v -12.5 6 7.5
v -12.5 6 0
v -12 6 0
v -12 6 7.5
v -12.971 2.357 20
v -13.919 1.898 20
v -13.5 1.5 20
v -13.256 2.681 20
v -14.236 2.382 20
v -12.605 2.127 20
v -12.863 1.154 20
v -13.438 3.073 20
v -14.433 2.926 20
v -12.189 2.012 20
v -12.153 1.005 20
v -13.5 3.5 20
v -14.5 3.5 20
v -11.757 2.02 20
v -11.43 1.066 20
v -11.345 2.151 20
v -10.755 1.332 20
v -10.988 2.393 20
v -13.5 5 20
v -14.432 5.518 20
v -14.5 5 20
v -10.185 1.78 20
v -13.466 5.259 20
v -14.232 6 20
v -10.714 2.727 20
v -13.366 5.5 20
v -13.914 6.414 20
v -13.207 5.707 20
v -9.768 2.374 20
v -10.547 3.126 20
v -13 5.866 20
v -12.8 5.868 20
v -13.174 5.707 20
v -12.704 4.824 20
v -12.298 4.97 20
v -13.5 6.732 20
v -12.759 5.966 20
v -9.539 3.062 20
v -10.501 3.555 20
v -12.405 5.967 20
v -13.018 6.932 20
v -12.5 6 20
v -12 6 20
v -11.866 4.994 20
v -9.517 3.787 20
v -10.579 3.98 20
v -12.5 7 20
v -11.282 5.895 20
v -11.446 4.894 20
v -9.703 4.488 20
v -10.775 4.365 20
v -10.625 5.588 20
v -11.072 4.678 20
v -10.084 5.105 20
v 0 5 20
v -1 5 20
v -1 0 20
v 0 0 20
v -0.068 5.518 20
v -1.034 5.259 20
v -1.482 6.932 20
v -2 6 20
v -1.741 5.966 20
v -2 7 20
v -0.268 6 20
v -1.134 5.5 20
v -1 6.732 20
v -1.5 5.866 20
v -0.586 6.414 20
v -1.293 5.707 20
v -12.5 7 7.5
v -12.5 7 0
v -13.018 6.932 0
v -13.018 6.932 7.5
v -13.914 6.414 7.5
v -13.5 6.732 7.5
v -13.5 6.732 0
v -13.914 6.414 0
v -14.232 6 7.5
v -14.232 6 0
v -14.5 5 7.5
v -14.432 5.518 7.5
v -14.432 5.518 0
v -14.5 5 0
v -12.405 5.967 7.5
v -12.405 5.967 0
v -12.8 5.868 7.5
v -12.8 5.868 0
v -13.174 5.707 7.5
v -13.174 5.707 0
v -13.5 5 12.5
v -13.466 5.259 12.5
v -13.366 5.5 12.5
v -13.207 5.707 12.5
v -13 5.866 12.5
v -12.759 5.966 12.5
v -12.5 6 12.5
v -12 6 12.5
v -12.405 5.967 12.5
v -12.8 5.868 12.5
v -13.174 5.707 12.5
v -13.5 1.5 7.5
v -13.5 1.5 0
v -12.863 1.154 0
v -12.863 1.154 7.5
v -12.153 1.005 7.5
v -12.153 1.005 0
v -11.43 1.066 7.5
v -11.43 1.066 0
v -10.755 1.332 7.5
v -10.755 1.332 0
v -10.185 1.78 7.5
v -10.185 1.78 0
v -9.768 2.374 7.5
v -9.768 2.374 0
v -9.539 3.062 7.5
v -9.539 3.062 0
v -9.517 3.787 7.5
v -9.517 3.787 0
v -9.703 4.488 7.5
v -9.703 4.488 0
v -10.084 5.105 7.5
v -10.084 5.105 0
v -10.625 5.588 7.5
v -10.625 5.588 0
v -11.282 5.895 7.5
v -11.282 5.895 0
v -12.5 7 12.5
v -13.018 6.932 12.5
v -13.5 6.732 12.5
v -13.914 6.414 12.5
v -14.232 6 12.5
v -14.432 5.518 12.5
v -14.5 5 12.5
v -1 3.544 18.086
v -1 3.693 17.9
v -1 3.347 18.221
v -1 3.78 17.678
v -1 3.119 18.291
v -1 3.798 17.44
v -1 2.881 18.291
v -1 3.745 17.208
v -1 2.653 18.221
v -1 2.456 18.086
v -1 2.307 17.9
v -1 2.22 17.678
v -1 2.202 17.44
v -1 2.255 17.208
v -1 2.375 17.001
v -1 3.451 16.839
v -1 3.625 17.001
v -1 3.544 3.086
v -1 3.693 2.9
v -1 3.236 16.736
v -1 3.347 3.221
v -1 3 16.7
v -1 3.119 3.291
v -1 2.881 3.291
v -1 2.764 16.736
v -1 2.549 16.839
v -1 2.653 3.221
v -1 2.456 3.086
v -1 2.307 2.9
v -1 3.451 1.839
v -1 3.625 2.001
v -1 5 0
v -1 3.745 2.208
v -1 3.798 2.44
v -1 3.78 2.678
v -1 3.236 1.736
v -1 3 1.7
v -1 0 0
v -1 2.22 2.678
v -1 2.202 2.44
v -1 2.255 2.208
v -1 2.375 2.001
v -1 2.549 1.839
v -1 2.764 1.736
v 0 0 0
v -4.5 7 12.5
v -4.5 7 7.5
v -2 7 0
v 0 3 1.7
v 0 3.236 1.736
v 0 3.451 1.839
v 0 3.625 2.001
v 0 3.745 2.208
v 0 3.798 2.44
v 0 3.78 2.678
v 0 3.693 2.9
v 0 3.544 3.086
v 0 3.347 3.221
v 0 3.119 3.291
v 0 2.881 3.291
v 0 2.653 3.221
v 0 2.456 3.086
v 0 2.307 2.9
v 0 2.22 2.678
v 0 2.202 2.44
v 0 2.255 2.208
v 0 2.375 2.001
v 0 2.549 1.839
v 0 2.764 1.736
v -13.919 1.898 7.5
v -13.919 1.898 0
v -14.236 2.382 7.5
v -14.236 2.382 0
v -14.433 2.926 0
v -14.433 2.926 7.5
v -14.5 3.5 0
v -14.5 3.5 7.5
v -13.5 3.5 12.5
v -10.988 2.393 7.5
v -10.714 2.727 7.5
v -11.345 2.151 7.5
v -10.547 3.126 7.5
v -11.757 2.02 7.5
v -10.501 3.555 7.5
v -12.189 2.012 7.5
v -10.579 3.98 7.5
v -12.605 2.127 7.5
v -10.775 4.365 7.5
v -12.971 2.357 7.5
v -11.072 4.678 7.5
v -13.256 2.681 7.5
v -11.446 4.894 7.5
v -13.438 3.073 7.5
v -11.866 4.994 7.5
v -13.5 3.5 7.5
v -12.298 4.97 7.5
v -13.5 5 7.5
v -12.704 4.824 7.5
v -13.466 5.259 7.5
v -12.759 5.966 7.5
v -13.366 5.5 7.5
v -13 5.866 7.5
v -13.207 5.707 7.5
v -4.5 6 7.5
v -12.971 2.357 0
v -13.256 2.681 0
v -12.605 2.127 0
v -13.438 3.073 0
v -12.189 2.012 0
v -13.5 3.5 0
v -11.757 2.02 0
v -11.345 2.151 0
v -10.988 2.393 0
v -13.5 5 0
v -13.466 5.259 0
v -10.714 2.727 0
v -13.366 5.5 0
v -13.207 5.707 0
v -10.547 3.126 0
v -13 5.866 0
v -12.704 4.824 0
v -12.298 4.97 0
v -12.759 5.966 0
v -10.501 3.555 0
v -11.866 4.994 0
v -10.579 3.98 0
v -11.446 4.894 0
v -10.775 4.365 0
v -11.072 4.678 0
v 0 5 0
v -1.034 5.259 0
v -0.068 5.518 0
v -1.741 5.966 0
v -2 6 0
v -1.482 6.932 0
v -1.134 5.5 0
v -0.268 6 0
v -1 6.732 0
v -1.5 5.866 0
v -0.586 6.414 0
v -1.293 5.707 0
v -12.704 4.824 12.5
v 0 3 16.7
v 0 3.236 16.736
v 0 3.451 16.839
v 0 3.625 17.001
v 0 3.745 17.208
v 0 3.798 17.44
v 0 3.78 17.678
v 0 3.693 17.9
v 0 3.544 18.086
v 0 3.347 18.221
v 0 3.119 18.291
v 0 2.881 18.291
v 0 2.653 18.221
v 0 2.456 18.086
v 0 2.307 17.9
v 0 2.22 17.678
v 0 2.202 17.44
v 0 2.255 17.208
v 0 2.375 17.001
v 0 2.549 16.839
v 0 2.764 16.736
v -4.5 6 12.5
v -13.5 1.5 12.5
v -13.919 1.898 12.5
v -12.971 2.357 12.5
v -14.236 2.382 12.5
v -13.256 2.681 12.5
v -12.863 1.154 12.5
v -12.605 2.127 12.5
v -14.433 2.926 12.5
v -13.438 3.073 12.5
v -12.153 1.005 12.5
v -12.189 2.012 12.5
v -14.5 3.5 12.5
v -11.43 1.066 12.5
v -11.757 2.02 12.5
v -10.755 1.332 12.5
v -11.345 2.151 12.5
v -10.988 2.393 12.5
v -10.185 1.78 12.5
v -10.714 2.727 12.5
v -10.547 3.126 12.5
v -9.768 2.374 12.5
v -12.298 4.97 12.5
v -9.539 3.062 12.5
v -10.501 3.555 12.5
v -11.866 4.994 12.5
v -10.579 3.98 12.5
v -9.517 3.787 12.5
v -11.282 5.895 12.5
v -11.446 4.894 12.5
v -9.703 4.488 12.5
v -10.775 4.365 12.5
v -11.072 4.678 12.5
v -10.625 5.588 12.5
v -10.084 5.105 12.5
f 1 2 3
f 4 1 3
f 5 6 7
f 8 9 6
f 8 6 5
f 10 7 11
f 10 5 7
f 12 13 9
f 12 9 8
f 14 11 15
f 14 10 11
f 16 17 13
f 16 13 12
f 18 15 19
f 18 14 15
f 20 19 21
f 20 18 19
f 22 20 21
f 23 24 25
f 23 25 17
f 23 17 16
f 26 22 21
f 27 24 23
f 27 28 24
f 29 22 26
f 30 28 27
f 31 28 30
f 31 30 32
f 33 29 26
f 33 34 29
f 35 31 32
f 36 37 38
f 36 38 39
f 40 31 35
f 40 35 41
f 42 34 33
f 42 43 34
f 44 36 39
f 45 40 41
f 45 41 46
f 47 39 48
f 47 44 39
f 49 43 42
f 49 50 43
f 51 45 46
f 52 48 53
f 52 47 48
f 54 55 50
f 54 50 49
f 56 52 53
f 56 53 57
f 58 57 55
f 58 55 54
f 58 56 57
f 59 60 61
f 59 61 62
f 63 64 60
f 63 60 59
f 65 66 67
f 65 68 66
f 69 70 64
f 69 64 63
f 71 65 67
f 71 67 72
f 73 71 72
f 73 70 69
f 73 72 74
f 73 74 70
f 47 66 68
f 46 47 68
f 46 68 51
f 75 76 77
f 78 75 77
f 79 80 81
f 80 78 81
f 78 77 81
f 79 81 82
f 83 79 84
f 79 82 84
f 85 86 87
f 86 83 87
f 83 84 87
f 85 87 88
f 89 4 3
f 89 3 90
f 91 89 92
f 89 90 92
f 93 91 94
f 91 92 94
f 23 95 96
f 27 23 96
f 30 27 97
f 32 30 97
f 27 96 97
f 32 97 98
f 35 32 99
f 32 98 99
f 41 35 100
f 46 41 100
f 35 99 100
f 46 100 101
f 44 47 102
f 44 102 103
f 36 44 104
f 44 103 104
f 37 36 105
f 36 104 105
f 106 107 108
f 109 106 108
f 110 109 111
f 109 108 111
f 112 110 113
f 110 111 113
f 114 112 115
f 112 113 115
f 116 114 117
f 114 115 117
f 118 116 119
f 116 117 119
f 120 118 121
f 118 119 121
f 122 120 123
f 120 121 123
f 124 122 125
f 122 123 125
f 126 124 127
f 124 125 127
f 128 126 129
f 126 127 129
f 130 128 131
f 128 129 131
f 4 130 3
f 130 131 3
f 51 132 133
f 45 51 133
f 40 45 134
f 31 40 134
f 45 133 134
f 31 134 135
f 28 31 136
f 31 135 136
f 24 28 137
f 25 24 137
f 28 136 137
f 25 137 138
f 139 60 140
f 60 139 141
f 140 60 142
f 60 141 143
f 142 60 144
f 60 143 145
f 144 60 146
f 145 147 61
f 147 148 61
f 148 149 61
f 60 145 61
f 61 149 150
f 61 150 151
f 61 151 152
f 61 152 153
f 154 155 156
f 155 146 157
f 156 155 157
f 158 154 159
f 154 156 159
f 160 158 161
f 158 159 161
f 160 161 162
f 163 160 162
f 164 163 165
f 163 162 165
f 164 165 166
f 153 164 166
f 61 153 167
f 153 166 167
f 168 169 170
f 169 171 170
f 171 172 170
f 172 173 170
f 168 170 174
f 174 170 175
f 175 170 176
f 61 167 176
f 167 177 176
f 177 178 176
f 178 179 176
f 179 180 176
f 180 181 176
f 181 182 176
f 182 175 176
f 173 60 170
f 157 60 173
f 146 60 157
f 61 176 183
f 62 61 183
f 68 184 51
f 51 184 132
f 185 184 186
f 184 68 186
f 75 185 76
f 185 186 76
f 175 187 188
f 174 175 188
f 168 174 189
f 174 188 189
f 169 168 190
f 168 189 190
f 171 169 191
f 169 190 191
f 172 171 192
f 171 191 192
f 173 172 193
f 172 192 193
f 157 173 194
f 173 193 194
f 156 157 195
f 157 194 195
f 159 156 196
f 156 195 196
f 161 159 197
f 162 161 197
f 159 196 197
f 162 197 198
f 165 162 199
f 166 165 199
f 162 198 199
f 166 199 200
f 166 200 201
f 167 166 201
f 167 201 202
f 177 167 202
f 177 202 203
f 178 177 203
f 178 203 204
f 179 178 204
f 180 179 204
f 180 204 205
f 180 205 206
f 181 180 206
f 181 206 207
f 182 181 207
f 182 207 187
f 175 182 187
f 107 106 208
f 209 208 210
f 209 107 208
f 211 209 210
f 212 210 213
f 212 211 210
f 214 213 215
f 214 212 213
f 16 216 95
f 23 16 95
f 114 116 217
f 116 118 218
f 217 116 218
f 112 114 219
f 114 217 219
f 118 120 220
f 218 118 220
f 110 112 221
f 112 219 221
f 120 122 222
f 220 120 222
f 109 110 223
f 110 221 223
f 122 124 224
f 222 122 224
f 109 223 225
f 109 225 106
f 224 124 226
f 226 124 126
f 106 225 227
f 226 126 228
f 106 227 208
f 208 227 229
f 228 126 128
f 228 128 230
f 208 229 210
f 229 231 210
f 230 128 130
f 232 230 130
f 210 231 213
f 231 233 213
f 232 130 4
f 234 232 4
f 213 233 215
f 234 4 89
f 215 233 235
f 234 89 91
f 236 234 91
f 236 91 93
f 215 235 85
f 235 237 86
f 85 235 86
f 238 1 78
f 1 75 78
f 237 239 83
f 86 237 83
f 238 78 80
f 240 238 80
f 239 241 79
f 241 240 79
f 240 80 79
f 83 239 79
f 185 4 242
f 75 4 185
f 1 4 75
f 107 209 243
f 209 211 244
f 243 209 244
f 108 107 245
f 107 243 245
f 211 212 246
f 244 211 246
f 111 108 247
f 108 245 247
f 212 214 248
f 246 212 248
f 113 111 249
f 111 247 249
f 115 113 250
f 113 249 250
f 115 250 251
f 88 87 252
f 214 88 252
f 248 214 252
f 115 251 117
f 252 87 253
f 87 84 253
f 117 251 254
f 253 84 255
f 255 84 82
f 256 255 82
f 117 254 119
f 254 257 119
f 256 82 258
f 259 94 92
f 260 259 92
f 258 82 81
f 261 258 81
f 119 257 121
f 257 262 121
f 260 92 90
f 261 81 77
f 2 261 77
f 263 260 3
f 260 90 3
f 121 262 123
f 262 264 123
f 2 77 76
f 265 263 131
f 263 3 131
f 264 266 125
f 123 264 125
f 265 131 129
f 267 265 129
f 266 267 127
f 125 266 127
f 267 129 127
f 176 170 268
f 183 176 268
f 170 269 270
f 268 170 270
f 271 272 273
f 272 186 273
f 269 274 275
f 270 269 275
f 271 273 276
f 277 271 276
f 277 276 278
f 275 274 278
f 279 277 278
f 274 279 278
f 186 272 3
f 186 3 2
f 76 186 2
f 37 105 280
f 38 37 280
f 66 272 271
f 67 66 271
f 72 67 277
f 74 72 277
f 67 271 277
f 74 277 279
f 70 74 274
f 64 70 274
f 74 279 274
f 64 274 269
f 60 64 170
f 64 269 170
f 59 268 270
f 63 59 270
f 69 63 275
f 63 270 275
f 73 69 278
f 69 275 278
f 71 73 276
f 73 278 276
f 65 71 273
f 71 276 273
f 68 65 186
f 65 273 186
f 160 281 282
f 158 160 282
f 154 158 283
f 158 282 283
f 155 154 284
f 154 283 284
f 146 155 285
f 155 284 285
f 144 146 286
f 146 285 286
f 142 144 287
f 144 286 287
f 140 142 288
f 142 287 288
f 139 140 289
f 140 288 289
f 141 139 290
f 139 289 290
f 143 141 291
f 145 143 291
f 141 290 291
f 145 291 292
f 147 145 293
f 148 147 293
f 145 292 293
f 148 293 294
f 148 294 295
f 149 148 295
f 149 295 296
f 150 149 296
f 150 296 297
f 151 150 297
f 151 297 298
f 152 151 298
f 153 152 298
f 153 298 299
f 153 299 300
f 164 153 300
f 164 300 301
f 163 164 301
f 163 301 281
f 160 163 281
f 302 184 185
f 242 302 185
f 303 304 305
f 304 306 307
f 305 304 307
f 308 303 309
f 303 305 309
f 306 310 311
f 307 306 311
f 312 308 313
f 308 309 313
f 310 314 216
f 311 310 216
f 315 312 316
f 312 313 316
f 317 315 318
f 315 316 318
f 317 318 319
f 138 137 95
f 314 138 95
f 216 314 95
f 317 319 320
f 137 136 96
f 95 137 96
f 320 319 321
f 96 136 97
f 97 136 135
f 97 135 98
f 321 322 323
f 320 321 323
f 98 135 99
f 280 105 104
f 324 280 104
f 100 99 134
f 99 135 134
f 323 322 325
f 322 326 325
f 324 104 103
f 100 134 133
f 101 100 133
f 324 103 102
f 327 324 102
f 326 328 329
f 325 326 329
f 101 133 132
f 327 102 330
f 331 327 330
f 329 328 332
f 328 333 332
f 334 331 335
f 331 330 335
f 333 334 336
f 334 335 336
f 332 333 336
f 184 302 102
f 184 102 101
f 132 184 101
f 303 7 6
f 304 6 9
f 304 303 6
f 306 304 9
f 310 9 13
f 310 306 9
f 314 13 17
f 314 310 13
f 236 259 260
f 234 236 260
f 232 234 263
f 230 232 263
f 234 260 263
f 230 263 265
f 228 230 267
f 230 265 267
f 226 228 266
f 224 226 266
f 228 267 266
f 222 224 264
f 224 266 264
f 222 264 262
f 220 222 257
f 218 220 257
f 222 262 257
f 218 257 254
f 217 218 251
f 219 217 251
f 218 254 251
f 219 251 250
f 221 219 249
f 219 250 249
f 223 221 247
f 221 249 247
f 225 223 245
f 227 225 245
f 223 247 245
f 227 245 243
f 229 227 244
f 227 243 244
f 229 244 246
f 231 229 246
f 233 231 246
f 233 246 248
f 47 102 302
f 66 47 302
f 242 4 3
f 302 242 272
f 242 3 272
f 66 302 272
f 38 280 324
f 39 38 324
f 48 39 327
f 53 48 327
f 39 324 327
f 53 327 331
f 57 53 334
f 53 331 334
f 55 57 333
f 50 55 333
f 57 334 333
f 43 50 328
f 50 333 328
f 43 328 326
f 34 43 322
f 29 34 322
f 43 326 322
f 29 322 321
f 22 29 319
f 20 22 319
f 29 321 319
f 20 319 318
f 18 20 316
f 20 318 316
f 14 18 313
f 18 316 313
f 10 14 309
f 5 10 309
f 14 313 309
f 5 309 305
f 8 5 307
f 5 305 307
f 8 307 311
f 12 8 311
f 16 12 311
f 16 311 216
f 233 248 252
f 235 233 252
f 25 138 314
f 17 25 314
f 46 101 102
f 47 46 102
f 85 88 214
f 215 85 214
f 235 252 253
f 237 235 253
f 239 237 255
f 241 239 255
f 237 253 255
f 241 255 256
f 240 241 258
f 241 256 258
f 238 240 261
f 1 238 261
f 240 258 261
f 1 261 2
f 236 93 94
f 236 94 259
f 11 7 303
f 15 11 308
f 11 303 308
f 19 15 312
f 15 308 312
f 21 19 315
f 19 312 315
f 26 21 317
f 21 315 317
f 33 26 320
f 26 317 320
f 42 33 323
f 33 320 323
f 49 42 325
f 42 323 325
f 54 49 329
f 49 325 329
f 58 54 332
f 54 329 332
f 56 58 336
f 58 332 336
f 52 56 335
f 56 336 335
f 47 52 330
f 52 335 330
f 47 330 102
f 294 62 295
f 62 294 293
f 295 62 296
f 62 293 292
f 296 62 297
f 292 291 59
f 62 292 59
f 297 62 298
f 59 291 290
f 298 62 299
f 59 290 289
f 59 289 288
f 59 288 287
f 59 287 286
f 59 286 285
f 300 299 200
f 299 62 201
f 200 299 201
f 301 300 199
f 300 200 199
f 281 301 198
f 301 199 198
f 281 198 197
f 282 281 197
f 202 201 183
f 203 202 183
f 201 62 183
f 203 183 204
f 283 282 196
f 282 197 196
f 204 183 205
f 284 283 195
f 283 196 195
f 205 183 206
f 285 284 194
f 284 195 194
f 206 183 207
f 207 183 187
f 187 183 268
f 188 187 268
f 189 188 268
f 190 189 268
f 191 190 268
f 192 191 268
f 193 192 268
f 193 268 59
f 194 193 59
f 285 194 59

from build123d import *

# Parameters (mm, degrees)
BASE_FLANGE1_DEPTH        = 20
HEM1_DEPTH                = 20
HEM1_2_DEPTH              = 20
SKETCH5_W                 = 8
SKETCH5_H                 = 5
SKETCH5_W_2               = 2
CUT_EXTRUDE4_DEPTH        = 10
M2X0_4_TAPPED_HOLE1_D     = 1.6
M2X0_4_TAPPED_HOLE1_DEPTH = 5.2
M2X0_4_TAPPED_HOLE1_TIP   = 0.480688495


# Read off the part's stored shape, not the designer's step: Hem1
# Sheet-metal steps are written as plain solids
with BuildPart() as part:
    # Sketch1 → Base-Flange1 (new body)
    with BuildSketch(Plane.XY):
        with BuildLine():
            Line((0, 0), (0, 5))
            ThreePointArc((0, 5), (-0.585786438, 6.414213562), (-2, 7))
            Line((-2, 7), (-12.5, 7))
            ThreePointArc((-12.5, 7), (-13.914213562, 6.414213562), (-14.5, 5))
            Line((-14.5, 5), (-14.5, 1))
            Line((-14.5, 1), (-13.5, 1))
            Line((-13.5, 1), (-13.5, 5))
            ThreePointArc((-13.5, 5), (-13.207106781, 5.707106781), (-12.5, 6))
            Line((-12.5, 6), (-2, 6))
            ThreePointArc((-2, 6), (-1.292893219, 5.707106781), (-1, 5))
            Line((-1, 5), (-1, 0))
            Line((-1, 0), (0, 0))
        make_face()
    extrude(amount=BASE_FLANGE1_DEPTH)

    # Hem1 outline → Hem1 (cut)
    with BuildSketch(Plane.XY):
        with BuildLine():
            Line((-13.5, 1), (-13.5, 1.5))
            ThreePointArc((-13.5, 1.5), (-14.236067978, 2.381966011), (-14.5, 3.5))
            Line((-14.5, 3.5), (-14.5, 1))
            Line((-14.5, 1), (-13.5, 1))
        make_face()
    extrude(amount=HEM1_DEPTH, mode=Mode.SUBTRACT)

    # Hem1 2 outline → Hem1 2 (add)
    with BuildSketch(Plane.XY):
        with BuildLine():
            Line((-13.173678907, 5.707368982), (-12.704207344, 4.824421389))
            ThreePointArc((-12.704207344, 4.824421389), (-10.714249049, 2.727442887), (-13.5, 3.5))
            Line((-13.5, 3.5), (-13.5, 1.5))
            ThreePointArc((-13.5, 1.5), (-9.507485574, 3.30668203), (-13.173678907, 5.707368982))
        make_face()
    extrude(amount=HEM1_2_DEPTH)

    # Sketch5 → Cut-Extrude4 (cut)
    with BuildSketch(Plane(origin=(0, 7, 0), x_dir=(1, 0, 0), z_dir=(0, 1, 0))):
        with Locations((-8.5, -10)):
            Rectangle(SKETCH5_W, SKETCH5_H)
        with Locations((-13.5, -10)):
            Rectangle(SKETCH5_W_2, SKETCH5_H)
    extrude(amount=-CUT_EXTRUDE4_DEPTH, mode=Mode.SUBTRACT)

    # M2x0.4 Tapped Hole1
    with Locations(Plane.ZY.offset(1)):
        with Locations((2.5, 3), (17.5, 3)):
            Hole(M2X0_4_TAPPED_HOLE1_D / 2, depth=M2X0_4_TAPPED_HOLE1_DEPTH)
            with Locations((0, 0, -(M2X0_4_TAPPED_HOLE1_DEPTH + M2X0_4_TAPPED_HOLE1_TIP / 2))):  # 118° drill point
                Cone(0, M2X0_4_TAPPED_HOLE1_D / 2, M2X0_4_TAPPED_HOLE1_TIP, mode=Mode.SUBTRACT)


solid = part.part
